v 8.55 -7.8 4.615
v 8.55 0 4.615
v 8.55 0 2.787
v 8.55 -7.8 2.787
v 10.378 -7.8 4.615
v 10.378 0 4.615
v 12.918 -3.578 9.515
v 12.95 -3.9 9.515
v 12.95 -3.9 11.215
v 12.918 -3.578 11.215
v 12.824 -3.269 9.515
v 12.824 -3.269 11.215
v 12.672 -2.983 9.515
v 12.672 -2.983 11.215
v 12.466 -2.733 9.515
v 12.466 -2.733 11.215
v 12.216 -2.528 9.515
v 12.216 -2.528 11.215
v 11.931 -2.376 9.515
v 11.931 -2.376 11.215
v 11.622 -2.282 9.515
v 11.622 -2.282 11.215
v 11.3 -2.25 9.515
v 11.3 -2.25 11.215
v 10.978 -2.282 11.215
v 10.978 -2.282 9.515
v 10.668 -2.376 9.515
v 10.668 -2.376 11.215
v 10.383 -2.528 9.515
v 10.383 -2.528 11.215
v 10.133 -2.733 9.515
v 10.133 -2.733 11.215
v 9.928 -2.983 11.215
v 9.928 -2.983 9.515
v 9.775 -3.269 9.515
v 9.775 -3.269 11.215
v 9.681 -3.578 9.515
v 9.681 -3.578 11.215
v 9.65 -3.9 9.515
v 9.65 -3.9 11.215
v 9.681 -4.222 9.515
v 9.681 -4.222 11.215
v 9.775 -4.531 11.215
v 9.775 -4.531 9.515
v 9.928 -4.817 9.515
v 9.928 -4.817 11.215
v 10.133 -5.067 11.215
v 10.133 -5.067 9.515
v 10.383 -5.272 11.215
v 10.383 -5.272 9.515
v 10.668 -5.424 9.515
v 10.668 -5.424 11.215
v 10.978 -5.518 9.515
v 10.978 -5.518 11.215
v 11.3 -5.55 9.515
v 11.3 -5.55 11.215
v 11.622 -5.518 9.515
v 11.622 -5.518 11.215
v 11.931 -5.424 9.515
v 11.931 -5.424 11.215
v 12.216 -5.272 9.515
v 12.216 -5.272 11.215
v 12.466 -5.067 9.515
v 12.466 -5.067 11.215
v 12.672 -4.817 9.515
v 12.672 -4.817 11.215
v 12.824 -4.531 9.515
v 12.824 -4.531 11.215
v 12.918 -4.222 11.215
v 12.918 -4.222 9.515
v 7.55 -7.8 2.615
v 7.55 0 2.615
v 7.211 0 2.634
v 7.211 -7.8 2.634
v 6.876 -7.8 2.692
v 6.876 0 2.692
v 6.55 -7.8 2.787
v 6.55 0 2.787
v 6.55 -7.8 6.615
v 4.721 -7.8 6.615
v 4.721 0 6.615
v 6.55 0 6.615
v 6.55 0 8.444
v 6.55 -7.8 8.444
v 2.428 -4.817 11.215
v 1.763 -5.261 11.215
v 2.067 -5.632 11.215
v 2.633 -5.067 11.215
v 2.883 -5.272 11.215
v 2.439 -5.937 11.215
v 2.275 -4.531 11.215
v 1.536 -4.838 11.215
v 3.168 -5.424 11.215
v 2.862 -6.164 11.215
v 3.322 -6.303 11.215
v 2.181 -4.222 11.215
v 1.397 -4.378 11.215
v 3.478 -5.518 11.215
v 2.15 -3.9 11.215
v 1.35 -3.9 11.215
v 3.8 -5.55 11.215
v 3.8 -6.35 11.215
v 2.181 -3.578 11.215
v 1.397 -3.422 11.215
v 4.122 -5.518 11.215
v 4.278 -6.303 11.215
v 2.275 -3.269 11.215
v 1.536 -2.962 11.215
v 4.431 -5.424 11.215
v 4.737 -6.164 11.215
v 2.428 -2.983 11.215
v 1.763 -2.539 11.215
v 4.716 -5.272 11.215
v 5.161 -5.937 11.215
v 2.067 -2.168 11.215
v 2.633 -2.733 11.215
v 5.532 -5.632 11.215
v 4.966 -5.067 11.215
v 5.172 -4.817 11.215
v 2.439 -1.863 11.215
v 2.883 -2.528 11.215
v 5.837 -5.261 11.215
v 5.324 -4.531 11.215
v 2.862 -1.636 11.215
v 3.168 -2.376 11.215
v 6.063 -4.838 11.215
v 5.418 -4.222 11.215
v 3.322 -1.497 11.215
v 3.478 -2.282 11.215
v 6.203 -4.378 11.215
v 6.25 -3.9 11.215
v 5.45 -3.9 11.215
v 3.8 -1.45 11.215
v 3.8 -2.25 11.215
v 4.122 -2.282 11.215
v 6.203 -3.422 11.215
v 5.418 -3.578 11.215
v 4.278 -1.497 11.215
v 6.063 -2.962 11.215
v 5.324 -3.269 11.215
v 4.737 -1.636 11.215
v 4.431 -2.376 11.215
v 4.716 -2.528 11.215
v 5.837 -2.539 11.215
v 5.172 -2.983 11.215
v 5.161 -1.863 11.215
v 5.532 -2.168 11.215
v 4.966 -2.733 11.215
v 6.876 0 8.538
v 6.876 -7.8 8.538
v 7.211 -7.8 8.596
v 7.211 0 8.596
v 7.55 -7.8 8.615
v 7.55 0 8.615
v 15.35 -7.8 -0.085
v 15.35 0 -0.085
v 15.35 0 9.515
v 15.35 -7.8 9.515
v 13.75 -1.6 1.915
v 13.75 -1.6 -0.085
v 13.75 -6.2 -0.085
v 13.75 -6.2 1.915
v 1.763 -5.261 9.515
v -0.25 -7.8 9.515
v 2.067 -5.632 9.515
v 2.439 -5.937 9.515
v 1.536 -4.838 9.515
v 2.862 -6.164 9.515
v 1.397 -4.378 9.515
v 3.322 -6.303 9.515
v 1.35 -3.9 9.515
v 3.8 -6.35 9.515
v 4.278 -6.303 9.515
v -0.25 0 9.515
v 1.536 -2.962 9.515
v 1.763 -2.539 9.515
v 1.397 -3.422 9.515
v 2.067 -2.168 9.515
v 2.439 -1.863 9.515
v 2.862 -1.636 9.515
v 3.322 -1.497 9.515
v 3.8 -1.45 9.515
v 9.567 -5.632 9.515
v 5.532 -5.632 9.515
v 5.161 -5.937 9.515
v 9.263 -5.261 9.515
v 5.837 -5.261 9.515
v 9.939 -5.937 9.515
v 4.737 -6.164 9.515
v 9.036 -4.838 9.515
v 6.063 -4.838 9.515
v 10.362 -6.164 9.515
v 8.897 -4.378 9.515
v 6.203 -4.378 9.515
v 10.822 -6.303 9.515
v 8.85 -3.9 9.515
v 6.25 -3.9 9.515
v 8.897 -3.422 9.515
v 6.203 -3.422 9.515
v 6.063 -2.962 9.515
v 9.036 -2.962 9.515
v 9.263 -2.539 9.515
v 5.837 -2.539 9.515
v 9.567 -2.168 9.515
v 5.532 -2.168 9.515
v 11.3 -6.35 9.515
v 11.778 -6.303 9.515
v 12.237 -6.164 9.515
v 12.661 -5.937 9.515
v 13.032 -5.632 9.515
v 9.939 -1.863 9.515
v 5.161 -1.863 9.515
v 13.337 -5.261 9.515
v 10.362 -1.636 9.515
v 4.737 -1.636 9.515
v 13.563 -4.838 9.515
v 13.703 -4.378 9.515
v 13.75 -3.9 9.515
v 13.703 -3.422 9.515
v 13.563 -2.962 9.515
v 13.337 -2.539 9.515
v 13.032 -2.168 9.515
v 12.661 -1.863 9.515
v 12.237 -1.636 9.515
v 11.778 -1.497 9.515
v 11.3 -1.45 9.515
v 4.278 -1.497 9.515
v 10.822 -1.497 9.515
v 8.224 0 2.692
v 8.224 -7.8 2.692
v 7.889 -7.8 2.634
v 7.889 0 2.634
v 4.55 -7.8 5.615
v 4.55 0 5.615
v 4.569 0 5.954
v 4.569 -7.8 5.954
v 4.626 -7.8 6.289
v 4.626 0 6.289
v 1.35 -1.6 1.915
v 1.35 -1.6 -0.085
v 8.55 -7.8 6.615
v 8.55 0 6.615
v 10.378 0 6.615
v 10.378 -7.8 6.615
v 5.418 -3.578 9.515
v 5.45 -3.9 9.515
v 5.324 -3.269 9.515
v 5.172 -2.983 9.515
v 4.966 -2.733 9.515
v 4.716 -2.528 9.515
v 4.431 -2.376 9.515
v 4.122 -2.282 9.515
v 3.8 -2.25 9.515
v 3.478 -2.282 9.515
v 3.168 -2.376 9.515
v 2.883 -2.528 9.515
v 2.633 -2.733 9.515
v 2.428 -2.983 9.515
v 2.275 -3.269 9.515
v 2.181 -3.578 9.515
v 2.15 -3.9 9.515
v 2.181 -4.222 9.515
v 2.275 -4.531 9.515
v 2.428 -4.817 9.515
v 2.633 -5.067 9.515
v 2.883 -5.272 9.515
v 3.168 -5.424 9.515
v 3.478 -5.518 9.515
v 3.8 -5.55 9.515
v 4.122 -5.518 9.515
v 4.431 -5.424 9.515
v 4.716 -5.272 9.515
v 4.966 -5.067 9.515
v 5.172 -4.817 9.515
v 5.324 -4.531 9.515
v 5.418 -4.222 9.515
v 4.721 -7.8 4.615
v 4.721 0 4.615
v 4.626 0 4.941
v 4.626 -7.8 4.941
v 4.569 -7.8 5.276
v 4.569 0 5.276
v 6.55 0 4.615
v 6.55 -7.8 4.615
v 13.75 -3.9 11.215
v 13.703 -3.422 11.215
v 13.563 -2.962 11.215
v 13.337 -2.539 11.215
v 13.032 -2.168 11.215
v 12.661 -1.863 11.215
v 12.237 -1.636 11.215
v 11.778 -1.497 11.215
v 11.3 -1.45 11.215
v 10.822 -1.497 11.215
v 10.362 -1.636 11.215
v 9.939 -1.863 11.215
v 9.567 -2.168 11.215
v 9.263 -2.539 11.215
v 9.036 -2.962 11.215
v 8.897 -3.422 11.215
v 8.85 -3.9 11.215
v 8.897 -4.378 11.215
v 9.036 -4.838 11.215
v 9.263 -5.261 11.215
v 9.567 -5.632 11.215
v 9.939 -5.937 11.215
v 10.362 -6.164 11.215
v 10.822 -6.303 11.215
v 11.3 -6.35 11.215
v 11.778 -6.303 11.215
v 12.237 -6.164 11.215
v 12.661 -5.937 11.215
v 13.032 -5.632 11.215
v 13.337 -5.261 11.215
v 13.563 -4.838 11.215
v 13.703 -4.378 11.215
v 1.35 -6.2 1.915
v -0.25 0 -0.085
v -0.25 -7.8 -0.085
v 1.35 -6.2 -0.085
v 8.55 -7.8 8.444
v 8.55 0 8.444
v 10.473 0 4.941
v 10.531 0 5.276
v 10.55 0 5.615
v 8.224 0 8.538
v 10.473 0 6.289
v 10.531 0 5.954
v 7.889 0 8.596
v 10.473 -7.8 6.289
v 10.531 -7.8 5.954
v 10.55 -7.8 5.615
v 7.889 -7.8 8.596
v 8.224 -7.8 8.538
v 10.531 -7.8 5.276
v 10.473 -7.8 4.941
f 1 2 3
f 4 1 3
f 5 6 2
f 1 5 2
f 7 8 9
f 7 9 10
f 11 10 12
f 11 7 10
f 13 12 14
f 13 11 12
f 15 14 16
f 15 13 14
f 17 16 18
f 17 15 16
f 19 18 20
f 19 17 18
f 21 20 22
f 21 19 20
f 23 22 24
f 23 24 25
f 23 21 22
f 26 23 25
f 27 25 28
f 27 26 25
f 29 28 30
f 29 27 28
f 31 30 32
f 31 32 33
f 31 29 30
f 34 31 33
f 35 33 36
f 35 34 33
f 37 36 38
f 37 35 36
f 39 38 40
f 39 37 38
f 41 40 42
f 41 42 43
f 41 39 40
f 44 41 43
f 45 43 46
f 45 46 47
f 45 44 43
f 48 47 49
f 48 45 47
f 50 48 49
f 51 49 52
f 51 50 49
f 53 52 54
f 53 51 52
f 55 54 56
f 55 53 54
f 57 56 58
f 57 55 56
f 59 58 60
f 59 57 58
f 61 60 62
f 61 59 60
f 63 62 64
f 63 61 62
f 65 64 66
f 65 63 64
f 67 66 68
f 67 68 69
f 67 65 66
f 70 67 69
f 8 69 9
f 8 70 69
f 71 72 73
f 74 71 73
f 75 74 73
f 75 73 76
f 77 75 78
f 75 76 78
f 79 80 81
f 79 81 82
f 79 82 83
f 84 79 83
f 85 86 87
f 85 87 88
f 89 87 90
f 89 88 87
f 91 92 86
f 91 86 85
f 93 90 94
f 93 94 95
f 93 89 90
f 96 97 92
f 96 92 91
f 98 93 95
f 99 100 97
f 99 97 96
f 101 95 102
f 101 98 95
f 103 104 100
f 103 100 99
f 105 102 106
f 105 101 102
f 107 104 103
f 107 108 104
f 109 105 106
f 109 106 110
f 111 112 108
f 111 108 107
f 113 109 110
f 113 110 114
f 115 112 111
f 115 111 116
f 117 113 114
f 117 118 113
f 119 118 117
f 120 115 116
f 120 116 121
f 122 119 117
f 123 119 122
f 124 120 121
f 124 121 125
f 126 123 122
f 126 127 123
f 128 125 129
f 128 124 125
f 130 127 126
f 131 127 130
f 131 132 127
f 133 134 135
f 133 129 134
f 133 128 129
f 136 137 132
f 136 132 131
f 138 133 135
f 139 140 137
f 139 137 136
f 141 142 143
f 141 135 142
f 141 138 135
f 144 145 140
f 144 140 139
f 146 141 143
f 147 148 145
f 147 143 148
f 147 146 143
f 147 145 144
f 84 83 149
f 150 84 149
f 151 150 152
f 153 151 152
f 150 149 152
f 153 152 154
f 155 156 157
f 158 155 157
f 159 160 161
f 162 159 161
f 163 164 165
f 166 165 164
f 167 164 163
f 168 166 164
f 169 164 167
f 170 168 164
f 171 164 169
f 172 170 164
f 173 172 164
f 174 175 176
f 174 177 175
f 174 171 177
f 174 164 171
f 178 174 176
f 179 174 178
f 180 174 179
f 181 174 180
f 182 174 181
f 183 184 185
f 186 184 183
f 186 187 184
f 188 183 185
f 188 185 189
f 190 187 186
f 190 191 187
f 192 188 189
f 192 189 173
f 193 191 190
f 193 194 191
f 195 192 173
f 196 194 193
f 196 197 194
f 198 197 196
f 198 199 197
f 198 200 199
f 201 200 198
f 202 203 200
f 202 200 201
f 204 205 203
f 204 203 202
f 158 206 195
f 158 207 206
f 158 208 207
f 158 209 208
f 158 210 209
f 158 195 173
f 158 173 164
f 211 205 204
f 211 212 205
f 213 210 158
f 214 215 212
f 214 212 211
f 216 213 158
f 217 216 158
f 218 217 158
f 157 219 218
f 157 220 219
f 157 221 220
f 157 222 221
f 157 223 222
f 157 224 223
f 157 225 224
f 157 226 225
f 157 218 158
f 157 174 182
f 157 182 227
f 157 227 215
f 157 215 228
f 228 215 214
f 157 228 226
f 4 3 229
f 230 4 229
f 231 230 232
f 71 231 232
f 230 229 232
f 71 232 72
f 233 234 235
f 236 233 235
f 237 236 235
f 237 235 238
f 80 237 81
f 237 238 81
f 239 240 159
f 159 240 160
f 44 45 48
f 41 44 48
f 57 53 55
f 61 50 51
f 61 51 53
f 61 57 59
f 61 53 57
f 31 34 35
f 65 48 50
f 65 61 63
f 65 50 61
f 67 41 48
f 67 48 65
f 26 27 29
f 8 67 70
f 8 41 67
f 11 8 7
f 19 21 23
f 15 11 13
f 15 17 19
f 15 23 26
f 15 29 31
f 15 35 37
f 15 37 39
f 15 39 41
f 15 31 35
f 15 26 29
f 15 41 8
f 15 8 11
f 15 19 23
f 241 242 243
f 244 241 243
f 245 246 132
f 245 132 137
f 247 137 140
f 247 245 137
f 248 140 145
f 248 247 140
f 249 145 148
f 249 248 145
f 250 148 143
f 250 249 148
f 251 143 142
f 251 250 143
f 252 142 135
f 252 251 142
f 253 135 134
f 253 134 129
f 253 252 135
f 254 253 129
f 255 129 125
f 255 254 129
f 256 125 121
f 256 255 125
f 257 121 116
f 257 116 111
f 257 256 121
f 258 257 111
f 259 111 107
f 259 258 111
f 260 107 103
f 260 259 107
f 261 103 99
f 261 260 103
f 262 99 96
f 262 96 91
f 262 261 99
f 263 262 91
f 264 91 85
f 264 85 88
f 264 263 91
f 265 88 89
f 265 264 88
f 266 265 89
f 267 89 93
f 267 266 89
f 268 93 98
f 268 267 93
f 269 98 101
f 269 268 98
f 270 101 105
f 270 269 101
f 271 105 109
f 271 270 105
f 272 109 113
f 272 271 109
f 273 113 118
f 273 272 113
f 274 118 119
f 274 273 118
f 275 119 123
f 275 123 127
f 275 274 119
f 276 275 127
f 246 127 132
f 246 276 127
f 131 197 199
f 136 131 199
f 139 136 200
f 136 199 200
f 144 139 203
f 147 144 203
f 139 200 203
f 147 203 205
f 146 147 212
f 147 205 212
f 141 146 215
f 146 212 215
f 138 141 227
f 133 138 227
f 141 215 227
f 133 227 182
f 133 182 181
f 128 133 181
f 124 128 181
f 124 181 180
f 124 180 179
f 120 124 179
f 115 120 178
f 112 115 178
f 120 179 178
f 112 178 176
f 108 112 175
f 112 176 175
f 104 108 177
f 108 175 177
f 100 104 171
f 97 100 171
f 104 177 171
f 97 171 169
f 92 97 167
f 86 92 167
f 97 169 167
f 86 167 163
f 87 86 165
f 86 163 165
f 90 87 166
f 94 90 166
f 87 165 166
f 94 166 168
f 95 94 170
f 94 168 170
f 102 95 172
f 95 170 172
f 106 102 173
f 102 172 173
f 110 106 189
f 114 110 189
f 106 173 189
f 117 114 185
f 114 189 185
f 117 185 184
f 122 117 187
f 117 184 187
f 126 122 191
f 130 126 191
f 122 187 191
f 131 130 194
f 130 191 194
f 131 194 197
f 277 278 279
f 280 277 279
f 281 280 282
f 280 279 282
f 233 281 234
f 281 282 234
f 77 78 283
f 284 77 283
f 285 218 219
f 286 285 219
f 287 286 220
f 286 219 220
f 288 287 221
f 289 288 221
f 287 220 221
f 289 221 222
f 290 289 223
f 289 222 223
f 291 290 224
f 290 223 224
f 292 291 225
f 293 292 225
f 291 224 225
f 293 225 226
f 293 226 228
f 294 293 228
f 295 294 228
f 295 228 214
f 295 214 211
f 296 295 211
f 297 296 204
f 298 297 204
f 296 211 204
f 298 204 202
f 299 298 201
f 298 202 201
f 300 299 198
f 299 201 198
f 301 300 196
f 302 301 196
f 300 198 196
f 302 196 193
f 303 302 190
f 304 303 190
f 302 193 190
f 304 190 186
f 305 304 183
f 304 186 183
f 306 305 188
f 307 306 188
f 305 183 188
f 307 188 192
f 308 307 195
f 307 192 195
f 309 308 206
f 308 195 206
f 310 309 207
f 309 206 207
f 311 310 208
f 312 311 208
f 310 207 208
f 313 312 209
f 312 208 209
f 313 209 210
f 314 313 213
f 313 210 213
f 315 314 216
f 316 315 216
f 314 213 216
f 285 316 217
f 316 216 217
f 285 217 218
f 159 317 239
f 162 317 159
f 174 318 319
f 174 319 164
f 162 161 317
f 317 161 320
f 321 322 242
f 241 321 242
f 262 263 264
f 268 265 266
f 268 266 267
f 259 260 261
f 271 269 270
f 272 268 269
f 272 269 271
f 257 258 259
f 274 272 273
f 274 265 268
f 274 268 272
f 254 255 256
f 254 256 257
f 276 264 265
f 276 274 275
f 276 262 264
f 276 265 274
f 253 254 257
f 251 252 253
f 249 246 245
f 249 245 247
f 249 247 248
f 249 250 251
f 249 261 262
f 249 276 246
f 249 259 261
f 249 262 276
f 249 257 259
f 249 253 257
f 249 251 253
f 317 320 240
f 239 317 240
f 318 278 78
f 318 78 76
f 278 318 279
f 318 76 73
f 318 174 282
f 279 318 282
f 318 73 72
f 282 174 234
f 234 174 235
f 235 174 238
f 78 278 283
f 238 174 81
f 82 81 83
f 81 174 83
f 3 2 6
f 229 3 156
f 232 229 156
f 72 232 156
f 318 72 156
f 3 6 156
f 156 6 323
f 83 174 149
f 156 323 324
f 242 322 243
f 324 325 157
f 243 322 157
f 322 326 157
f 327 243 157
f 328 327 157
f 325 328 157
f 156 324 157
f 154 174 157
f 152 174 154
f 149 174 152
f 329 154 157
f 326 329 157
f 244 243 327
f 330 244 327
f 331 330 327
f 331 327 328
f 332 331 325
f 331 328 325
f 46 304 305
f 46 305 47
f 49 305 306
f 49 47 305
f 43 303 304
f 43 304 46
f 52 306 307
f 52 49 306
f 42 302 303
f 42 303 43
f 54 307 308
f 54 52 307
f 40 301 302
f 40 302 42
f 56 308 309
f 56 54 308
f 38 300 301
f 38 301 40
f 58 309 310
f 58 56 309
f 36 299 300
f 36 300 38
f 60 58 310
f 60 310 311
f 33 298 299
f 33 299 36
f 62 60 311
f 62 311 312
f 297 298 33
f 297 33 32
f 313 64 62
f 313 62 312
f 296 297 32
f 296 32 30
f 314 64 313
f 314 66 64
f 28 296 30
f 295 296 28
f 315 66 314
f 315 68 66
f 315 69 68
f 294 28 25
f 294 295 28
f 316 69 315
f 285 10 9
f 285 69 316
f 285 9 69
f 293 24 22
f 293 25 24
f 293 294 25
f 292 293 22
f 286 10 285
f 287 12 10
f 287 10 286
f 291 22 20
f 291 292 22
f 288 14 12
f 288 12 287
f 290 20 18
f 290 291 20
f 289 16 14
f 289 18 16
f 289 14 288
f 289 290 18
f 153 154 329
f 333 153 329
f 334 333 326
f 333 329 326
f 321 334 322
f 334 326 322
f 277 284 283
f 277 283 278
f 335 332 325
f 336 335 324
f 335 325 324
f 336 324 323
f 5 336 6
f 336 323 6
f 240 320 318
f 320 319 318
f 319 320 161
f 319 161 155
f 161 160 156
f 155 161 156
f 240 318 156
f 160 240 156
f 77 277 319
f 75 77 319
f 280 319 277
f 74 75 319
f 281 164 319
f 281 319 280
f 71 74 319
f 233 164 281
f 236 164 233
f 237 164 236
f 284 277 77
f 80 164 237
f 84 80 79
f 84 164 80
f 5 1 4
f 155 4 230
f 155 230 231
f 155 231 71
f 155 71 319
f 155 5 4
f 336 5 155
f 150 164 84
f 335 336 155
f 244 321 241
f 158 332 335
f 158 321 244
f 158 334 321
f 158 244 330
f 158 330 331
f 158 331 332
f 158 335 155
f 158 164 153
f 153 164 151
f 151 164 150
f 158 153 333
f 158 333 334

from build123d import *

# Parameters (mm, degrees)
F0_W     = 15.6
F0_H     = 9.6
F1_DEPTH = 7.8
F2_R     = 2.45
F2_R_2   = 1.65
F3_DEPTH = 1.7
F5_DEPTH = 2


# Not quite as in the source:
# - a feature names something its author has since deleted; it is built from what else it names


with BuildPart() as f1:
    # F0 (on Front) → F1 (new body)
    with BuildSketch(Plane.XZ):
        with Locations((7.5497636572, 4.7150965011)):
            Rectangle(F0_W, F0_H)
        with BuildLine():
            Line((10.5497636572, 6.6150965011), (10.5497636572, 5.6150965011))
            Line((10.5497636572, 5.6150965011), (10.5497636572, 4.6150965011))
            Line((10.5497636572, 4.6150965011), (10.3781907819, 4.6150965011))
            ThreePointArc((10.3781907819, 4.6150965011), (9.6710840007, 3.4937761575), (8.5497636572, 2.7866693764))
            Line((8.5497636572, 2.7866693764), (8.5497636572, 2.6150965011))
            Line((8.5497636572, 2.6150965011), (7.5497636572, 2.6150965011))
            Line((7.5497636572, 2.6150965011), (6.5497636572, 2.6150965011))
            Line((6.5497636572, 2.6150965011), (6.5497636572, 2.7866693764))
            ThreePointArc((6.5497636572, 2.7866693764), (5.4284433136, 3.4937761575), (4.7213365324, 4.6150965011))
            Line((4.7213365324, 4.6150965011), (4.5497636572, 4.6150965011))
            Line((4.5497636572, 4.6150965011), (4.5497636572, 5.6150965067))
            Line((4.5497636572, 5.6150965067), (4.5497636572, 6.6150965011))
            Line((4.5497636572, 6.6150965011), (4.7213365324, 6.6150965011))
            ThreePointArc((4.7213365324, 6.6150965011), (5.4284433136, 7.7364168447), (6.5497636572, 8.4435236258))
            Line((6.5497636572, 8.4435236258), (6.5497636572, 8.6150965011))
            Line((6.5497636572, 8.6150965011), (7.5497636572, 8.6150965011))
            Line((7.5497636572, 8.6150965011), (8.5497636572, 8.6150965011))
            Line((8.5497636572, 8.6150965011), (8.5497636572, 8.4435236258))
            ThreePointArc((8.5497636572, 8.4435236258), (9.6710840007, 7.7364168447), (10.3781907819, 6.6150965011))
            Line((10.3781907819, 6.6150965011), (10.5497636572, 6.6150965011))
        make_face(mode=Mode.SUBTRACT)
        with BuildLine():
            ThreePointArc((8.5497636572, 2.7866693764), (9.6710840007, 3.4937761575), (10.3781907819, 4.6150965011))
            Line((10.3781907819, 4.6150965011), (8.5497636572, 4.6150965011))
            Line((8.5497636572, 4.6150965011), (8.5497636572, 2.7866693764))
        make_face()
        with BuildLine():
            Line((8.5497636572, 6.6150965011), (10.3781907819, 6.6150965011))
            ThreePointArc((10.3781907819, 6.6150965011), (9.6710840007, 7.7364168447), (8.5497636572, 8.4435236258))
            Line((8.5497636572, 8.4435236258), (8.5497636572, 6.6150965011))
        make_face()
        with BuildLine():
            Line((4.7213365324, 6.6150965011), (6.5497636572, 6.6150965011))
            Line((6.5497636572, 6.6150965011), (6.5497636572, 8.4435236258))
            ThreePointArc((6.5497636572, 8.4435236258), (5.4284433136, 7.7364168447), (4.7213365324, 6.6150965011))
        make_face()
        with BuildLine():
            Line((6.5497636572, 2.7866693764), (6.5497636572, 4.6150965011))
            Line((6.5497636572, 4.6150965011), (4.7213365324, 4.6150965011))
            ThreePointArc((4.7213365324, 4.6150965011), (5.4284433136, 3.4937761575), (6.5497636572, 2.7866693764))
        make_face()
        with BuildLine():
            Line((10.5497636572, 4.6150965011), (10.5497636572, 5.6150965011))
            ThreePointArc((10.5497636572, 5.6150965011), (10.5065593361, 5.1077905649), (10.3781907819, 4.6150965011))
            Line((10.3781907819, 4.6150965011), (10.5497636572, 4.6150965011))
        make_face()
        with BuildLine():
            ThreePointArc((10.3781907819, 6.6150965011), (10.5065593361, 6.1224024373), (10.5497636572, 5.6150965011))
            Line((10.5497636572, 5.6150965011), (10.5497636572, 6.6150965011))
            Line((10.5497636572, 6.6150965011), (10.3781907819, 6.6150965011))
        make_face()
        with BuildLine():
            ThreePointArc((7.5497636572, 8.6150965011), (8.0570695933, 8.5718921801), (8.5497636572, 8.4435236258))
            Line((8.5497636572, 8.4435236258), (8.5497636572, 8.6150965011))
            Line((8.5497636572, 8.6150965011), (7.5497636572, 8.6150965011))
        make_face()
        with BuildLine():
            ThreePointArc((6.5497636572, 8.4435236258), (7.042457721, 8.5718921801), (7.5497636572, 8.6150965011))
            Line((7.5497636572, 8.6150965011), (6.5497636572, 8.6150965011))
            Line((6.5497636572, 8.6150965011), (6.5497636572, 8.4435236258))
        make_face()
        with BuildLine():
            ThreePointArc((4.5497636572, 5.6150965067), (4.5929679787, 6.12240244), (4.7213365324, 6.6150965011))
            Line((4.7213365324, 6.6150965011), (4.5497636572, 6.6150965011))
            Line((4.5497636572, 6.6150965011), (4.5497636572, 5.6150965067))
        make_face()
        with BuildLine():
            Line((4.5497636572, 4.6150965011), (4.7213365324, 4.6150965011))
            ThreePointArc((4.7213365324, 4.6150965011), (4.5929679777, 5.1077905677), (4.5497636572, 5.6150965067))
            Line((4.5497636572, 5.6150965067), (4.5497636572, 4.6150965011))
        make_face()
        with BuildLine():
            Line((6.5497636572, 2.6150965011), (7.5497636572, 2.6150965011))
            ThreePointArc((7.5497636572, 2.6150965011), (7.042457721, 2.6583008221), (6.5497636572, 2.7866693764))
            Line((6.5497636572, 2.7866693764), (6.5497636572, 2.6150965011))
        make_face()
        with BuildLine():
            Line((8.5497636572, 2.6150965011), (8.5497636572, 2.7866693764))
            ThreePointArc((8.5497636572, 2.7866693764), (8.0570695933, 2.6583008221), (7.5497636572, 2.6150965011))
            Line((7.5497636572, 2.6150965011), (8.5497636572, 2.6150965011))
        make_face()
    extrude(amount=F1_DEPTH)

    # F2 (on face) → F3 (join)
    with BuildSketch(Plane.XY.offset(9.5150965011)):
        with Locations((3.7997636572, -3.9)):
            Circle(F2_R)
        with Locations((3.7997636572, -3.9)):
            Circle(F2_R_2, mode=Mode.SUBTRACT)
        with Locations((11.2997636572, -3.9)):
            Circle(F2_R)
        with Locations((11.2997636572, -3.9)):
            Circle(F2_R_2, mode=Mode.SUBTRACT)
    extrude(amount=F3_DEPTH)

    # F4 (on face) → F5 (cut)
    with BuildSketch(Plane(origin=(0, 0, -0.0849034989), x_dir=(1, 0, 0), z_dir=(0, 0, -1))):
        Polygon((1.3497636572, 6.2), (1.3497636572, 3.9), (1.3497636572, 1.6), (7.5497636572, 1.6), (13.7497636572, 1.6), (13.7497636572, 3.9), (13.7497636572, 6.2), (7.5497636572, 6.2), align=None)
    extrude(amount=-F5_DEPTH, mode=Mode.SUBTRACT)


solid = f1.part
